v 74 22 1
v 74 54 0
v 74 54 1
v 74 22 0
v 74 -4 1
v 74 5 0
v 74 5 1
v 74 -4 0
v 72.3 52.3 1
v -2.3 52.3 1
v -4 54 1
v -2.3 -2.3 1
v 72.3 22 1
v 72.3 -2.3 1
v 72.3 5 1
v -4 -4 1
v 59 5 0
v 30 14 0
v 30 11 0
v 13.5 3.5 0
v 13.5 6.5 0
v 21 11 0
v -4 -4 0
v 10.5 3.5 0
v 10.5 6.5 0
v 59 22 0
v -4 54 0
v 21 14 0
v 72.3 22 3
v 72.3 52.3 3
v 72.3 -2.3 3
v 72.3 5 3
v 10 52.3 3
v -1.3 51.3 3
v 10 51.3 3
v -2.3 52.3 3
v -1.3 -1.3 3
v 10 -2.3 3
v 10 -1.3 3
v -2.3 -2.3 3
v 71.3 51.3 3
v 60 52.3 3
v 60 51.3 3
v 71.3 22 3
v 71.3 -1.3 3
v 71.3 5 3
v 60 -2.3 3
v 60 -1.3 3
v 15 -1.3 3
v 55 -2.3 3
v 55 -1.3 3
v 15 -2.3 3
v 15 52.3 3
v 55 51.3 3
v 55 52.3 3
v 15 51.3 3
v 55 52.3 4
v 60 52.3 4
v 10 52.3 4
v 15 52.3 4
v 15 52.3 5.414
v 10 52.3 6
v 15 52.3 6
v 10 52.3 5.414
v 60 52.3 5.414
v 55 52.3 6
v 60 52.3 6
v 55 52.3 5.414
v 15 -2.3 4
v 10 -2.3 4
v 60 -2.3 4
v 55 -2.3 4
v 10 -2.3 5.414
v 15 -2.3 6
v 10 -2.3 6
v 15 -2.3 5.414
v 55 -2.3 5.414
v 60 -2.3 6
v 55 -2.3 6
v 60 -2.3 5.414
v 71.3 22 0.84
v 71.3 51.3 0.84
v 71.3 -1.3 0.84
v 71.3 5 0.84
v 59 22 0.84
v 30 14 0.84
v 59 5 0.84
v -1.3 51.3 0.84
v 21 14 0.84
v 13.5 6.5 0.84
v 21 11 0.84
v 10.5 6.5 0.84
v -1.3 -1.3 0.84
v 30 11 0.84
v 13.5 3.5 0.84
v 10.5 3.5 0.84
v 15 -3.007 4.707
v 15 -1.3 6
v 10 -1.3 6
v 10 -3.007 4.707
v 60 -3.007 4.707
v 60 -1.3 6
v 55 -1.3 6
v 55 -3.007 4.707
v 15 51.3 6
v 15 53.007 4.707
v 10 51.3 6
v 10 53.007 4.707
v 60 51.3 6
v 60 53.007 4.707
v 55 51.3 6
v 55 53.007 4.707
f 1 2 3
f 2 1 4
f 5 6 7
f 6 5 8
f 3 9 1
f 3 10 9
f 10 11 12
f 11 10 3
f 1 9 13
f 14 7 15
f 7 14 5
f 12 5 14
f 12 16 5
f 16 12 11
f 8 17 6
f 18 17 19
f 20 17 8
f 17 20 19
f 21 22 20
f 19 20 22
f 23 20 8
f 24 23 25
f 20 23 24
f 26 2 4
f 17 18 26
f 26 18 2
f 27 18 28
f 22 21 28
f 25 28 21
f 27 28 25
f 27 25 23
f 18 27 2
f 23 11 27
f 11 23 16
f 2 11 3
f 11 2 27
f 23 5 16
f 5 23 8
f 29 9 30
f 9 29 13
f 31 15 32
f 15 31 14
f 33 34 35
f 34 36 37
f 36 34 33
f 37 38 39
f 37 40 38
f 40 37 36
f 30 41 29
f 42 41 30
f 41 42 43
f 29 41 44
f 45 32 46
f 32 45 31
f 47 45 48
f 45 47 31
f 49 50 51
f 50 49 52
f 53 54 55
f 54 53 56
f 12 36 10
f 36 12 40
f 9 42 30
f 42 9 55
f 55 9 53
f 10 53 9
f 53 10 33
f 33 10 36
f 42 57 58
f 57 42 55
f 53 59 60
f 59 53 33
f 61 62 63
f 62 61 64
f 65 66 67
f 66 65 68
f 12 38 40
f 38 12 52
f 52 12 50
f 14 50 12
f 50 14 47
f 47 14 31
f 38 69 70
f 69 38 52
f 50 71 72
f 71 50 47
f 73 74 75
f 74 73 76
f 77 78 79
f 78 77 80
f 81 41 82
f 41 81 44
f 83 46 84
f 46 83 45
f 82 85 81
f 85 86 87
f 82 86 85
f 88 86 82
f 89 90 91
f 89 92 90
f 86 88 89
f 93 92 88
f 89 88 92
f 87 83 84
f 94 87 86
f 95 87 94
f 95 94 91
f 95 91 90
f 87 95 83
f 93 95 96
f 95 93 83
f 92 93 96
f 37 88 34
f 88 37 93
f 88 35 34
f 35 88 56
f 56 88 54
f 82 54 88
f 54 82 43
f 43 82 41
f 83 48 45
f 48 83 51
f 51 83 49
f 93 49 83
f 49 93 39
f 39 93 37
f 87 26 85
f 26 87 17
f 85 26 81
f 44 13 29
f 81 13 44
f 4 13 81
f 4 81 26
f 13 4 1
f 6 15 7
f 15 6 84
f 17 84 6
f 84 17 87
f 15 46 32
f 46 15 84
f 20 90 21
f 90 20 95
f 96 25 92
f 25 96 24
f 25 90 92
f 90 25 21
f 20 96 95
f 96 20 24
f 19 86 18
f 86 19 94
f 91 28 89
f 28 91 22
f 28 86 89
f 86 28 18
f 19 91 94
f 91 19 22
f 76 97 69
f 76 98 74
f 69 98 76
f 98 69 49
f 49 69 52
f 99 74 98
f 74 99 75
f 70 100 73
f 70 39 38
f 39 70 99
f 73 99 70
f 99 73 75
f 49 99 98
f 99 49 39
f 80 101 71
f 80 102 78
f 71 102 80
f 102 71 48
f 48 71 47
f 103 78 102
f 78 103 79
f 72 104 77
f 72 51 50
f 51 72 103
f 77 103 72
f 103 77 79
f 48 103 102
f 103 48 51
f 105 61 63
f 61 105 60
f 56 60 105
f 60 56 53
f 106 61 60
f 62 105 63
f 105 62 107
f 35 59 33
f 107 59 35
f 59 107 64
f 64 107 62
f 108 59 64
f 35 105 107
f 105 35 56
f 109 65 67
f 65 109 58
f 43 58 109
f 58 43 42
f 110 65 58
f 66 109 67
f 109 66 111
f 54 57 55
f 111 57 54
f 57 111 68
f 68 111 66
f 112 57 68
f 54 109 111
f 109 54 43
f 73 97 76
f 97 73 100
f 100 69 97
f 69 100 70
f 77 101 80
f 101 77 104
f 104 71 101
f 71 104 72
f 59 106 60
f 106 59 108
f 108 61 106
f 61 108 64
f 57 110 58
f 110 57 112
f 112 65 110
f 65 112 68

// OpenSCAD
//15
//2
//22

tl = 2.3;

difference()
{
    union()
    {
        translate([-4,-4,0])
            cube(size=[70+4*2,50+4*2,1]);
        
        translate([-tl,-tl,0])
            cube(size=[70+2*tl,50+2*tl,3]);
    }
    
    union()
    {
        translate([-tl+1,-tl+1,.24+.2*3])
            cube(size=[70+2*(tl-1),50+2*(tl-1),3]);
        
        translate([74-15,5,0])
            cube([15,17,4]);
        
        translate([16-4-1.5,9-4-1.5,0])
            cube([3,3,3]);
        
        translate([74-44-9,18-3-4,0])
            cube([3*3,3,3]);
    }
}

translate([10,-tl,3])
    cube([5,1,3]);
translate([70-10-5,-tl,3])
    cube([5,1,3]);
translate([10,50+tl-1,3])
    cube([5,1,3]);
translate([70-10-5,50+tl-1,3])
    cube([5,1,3]);

translate([10,-tl,4])
    rotate([45,0,0])
        cube([5,1,1]);
translate([70-10-5,-tl,4])
    rotate([45,0,0])
        cube([5,1,1]);
translate([10,50+tl-1+1,4])
    rotate([45,0,0])
        cube([5,1,1]);
translate([70-10-5,50+tl-1+1,4])
    rotate([45,0,0])
        cube([5,1,1]);
